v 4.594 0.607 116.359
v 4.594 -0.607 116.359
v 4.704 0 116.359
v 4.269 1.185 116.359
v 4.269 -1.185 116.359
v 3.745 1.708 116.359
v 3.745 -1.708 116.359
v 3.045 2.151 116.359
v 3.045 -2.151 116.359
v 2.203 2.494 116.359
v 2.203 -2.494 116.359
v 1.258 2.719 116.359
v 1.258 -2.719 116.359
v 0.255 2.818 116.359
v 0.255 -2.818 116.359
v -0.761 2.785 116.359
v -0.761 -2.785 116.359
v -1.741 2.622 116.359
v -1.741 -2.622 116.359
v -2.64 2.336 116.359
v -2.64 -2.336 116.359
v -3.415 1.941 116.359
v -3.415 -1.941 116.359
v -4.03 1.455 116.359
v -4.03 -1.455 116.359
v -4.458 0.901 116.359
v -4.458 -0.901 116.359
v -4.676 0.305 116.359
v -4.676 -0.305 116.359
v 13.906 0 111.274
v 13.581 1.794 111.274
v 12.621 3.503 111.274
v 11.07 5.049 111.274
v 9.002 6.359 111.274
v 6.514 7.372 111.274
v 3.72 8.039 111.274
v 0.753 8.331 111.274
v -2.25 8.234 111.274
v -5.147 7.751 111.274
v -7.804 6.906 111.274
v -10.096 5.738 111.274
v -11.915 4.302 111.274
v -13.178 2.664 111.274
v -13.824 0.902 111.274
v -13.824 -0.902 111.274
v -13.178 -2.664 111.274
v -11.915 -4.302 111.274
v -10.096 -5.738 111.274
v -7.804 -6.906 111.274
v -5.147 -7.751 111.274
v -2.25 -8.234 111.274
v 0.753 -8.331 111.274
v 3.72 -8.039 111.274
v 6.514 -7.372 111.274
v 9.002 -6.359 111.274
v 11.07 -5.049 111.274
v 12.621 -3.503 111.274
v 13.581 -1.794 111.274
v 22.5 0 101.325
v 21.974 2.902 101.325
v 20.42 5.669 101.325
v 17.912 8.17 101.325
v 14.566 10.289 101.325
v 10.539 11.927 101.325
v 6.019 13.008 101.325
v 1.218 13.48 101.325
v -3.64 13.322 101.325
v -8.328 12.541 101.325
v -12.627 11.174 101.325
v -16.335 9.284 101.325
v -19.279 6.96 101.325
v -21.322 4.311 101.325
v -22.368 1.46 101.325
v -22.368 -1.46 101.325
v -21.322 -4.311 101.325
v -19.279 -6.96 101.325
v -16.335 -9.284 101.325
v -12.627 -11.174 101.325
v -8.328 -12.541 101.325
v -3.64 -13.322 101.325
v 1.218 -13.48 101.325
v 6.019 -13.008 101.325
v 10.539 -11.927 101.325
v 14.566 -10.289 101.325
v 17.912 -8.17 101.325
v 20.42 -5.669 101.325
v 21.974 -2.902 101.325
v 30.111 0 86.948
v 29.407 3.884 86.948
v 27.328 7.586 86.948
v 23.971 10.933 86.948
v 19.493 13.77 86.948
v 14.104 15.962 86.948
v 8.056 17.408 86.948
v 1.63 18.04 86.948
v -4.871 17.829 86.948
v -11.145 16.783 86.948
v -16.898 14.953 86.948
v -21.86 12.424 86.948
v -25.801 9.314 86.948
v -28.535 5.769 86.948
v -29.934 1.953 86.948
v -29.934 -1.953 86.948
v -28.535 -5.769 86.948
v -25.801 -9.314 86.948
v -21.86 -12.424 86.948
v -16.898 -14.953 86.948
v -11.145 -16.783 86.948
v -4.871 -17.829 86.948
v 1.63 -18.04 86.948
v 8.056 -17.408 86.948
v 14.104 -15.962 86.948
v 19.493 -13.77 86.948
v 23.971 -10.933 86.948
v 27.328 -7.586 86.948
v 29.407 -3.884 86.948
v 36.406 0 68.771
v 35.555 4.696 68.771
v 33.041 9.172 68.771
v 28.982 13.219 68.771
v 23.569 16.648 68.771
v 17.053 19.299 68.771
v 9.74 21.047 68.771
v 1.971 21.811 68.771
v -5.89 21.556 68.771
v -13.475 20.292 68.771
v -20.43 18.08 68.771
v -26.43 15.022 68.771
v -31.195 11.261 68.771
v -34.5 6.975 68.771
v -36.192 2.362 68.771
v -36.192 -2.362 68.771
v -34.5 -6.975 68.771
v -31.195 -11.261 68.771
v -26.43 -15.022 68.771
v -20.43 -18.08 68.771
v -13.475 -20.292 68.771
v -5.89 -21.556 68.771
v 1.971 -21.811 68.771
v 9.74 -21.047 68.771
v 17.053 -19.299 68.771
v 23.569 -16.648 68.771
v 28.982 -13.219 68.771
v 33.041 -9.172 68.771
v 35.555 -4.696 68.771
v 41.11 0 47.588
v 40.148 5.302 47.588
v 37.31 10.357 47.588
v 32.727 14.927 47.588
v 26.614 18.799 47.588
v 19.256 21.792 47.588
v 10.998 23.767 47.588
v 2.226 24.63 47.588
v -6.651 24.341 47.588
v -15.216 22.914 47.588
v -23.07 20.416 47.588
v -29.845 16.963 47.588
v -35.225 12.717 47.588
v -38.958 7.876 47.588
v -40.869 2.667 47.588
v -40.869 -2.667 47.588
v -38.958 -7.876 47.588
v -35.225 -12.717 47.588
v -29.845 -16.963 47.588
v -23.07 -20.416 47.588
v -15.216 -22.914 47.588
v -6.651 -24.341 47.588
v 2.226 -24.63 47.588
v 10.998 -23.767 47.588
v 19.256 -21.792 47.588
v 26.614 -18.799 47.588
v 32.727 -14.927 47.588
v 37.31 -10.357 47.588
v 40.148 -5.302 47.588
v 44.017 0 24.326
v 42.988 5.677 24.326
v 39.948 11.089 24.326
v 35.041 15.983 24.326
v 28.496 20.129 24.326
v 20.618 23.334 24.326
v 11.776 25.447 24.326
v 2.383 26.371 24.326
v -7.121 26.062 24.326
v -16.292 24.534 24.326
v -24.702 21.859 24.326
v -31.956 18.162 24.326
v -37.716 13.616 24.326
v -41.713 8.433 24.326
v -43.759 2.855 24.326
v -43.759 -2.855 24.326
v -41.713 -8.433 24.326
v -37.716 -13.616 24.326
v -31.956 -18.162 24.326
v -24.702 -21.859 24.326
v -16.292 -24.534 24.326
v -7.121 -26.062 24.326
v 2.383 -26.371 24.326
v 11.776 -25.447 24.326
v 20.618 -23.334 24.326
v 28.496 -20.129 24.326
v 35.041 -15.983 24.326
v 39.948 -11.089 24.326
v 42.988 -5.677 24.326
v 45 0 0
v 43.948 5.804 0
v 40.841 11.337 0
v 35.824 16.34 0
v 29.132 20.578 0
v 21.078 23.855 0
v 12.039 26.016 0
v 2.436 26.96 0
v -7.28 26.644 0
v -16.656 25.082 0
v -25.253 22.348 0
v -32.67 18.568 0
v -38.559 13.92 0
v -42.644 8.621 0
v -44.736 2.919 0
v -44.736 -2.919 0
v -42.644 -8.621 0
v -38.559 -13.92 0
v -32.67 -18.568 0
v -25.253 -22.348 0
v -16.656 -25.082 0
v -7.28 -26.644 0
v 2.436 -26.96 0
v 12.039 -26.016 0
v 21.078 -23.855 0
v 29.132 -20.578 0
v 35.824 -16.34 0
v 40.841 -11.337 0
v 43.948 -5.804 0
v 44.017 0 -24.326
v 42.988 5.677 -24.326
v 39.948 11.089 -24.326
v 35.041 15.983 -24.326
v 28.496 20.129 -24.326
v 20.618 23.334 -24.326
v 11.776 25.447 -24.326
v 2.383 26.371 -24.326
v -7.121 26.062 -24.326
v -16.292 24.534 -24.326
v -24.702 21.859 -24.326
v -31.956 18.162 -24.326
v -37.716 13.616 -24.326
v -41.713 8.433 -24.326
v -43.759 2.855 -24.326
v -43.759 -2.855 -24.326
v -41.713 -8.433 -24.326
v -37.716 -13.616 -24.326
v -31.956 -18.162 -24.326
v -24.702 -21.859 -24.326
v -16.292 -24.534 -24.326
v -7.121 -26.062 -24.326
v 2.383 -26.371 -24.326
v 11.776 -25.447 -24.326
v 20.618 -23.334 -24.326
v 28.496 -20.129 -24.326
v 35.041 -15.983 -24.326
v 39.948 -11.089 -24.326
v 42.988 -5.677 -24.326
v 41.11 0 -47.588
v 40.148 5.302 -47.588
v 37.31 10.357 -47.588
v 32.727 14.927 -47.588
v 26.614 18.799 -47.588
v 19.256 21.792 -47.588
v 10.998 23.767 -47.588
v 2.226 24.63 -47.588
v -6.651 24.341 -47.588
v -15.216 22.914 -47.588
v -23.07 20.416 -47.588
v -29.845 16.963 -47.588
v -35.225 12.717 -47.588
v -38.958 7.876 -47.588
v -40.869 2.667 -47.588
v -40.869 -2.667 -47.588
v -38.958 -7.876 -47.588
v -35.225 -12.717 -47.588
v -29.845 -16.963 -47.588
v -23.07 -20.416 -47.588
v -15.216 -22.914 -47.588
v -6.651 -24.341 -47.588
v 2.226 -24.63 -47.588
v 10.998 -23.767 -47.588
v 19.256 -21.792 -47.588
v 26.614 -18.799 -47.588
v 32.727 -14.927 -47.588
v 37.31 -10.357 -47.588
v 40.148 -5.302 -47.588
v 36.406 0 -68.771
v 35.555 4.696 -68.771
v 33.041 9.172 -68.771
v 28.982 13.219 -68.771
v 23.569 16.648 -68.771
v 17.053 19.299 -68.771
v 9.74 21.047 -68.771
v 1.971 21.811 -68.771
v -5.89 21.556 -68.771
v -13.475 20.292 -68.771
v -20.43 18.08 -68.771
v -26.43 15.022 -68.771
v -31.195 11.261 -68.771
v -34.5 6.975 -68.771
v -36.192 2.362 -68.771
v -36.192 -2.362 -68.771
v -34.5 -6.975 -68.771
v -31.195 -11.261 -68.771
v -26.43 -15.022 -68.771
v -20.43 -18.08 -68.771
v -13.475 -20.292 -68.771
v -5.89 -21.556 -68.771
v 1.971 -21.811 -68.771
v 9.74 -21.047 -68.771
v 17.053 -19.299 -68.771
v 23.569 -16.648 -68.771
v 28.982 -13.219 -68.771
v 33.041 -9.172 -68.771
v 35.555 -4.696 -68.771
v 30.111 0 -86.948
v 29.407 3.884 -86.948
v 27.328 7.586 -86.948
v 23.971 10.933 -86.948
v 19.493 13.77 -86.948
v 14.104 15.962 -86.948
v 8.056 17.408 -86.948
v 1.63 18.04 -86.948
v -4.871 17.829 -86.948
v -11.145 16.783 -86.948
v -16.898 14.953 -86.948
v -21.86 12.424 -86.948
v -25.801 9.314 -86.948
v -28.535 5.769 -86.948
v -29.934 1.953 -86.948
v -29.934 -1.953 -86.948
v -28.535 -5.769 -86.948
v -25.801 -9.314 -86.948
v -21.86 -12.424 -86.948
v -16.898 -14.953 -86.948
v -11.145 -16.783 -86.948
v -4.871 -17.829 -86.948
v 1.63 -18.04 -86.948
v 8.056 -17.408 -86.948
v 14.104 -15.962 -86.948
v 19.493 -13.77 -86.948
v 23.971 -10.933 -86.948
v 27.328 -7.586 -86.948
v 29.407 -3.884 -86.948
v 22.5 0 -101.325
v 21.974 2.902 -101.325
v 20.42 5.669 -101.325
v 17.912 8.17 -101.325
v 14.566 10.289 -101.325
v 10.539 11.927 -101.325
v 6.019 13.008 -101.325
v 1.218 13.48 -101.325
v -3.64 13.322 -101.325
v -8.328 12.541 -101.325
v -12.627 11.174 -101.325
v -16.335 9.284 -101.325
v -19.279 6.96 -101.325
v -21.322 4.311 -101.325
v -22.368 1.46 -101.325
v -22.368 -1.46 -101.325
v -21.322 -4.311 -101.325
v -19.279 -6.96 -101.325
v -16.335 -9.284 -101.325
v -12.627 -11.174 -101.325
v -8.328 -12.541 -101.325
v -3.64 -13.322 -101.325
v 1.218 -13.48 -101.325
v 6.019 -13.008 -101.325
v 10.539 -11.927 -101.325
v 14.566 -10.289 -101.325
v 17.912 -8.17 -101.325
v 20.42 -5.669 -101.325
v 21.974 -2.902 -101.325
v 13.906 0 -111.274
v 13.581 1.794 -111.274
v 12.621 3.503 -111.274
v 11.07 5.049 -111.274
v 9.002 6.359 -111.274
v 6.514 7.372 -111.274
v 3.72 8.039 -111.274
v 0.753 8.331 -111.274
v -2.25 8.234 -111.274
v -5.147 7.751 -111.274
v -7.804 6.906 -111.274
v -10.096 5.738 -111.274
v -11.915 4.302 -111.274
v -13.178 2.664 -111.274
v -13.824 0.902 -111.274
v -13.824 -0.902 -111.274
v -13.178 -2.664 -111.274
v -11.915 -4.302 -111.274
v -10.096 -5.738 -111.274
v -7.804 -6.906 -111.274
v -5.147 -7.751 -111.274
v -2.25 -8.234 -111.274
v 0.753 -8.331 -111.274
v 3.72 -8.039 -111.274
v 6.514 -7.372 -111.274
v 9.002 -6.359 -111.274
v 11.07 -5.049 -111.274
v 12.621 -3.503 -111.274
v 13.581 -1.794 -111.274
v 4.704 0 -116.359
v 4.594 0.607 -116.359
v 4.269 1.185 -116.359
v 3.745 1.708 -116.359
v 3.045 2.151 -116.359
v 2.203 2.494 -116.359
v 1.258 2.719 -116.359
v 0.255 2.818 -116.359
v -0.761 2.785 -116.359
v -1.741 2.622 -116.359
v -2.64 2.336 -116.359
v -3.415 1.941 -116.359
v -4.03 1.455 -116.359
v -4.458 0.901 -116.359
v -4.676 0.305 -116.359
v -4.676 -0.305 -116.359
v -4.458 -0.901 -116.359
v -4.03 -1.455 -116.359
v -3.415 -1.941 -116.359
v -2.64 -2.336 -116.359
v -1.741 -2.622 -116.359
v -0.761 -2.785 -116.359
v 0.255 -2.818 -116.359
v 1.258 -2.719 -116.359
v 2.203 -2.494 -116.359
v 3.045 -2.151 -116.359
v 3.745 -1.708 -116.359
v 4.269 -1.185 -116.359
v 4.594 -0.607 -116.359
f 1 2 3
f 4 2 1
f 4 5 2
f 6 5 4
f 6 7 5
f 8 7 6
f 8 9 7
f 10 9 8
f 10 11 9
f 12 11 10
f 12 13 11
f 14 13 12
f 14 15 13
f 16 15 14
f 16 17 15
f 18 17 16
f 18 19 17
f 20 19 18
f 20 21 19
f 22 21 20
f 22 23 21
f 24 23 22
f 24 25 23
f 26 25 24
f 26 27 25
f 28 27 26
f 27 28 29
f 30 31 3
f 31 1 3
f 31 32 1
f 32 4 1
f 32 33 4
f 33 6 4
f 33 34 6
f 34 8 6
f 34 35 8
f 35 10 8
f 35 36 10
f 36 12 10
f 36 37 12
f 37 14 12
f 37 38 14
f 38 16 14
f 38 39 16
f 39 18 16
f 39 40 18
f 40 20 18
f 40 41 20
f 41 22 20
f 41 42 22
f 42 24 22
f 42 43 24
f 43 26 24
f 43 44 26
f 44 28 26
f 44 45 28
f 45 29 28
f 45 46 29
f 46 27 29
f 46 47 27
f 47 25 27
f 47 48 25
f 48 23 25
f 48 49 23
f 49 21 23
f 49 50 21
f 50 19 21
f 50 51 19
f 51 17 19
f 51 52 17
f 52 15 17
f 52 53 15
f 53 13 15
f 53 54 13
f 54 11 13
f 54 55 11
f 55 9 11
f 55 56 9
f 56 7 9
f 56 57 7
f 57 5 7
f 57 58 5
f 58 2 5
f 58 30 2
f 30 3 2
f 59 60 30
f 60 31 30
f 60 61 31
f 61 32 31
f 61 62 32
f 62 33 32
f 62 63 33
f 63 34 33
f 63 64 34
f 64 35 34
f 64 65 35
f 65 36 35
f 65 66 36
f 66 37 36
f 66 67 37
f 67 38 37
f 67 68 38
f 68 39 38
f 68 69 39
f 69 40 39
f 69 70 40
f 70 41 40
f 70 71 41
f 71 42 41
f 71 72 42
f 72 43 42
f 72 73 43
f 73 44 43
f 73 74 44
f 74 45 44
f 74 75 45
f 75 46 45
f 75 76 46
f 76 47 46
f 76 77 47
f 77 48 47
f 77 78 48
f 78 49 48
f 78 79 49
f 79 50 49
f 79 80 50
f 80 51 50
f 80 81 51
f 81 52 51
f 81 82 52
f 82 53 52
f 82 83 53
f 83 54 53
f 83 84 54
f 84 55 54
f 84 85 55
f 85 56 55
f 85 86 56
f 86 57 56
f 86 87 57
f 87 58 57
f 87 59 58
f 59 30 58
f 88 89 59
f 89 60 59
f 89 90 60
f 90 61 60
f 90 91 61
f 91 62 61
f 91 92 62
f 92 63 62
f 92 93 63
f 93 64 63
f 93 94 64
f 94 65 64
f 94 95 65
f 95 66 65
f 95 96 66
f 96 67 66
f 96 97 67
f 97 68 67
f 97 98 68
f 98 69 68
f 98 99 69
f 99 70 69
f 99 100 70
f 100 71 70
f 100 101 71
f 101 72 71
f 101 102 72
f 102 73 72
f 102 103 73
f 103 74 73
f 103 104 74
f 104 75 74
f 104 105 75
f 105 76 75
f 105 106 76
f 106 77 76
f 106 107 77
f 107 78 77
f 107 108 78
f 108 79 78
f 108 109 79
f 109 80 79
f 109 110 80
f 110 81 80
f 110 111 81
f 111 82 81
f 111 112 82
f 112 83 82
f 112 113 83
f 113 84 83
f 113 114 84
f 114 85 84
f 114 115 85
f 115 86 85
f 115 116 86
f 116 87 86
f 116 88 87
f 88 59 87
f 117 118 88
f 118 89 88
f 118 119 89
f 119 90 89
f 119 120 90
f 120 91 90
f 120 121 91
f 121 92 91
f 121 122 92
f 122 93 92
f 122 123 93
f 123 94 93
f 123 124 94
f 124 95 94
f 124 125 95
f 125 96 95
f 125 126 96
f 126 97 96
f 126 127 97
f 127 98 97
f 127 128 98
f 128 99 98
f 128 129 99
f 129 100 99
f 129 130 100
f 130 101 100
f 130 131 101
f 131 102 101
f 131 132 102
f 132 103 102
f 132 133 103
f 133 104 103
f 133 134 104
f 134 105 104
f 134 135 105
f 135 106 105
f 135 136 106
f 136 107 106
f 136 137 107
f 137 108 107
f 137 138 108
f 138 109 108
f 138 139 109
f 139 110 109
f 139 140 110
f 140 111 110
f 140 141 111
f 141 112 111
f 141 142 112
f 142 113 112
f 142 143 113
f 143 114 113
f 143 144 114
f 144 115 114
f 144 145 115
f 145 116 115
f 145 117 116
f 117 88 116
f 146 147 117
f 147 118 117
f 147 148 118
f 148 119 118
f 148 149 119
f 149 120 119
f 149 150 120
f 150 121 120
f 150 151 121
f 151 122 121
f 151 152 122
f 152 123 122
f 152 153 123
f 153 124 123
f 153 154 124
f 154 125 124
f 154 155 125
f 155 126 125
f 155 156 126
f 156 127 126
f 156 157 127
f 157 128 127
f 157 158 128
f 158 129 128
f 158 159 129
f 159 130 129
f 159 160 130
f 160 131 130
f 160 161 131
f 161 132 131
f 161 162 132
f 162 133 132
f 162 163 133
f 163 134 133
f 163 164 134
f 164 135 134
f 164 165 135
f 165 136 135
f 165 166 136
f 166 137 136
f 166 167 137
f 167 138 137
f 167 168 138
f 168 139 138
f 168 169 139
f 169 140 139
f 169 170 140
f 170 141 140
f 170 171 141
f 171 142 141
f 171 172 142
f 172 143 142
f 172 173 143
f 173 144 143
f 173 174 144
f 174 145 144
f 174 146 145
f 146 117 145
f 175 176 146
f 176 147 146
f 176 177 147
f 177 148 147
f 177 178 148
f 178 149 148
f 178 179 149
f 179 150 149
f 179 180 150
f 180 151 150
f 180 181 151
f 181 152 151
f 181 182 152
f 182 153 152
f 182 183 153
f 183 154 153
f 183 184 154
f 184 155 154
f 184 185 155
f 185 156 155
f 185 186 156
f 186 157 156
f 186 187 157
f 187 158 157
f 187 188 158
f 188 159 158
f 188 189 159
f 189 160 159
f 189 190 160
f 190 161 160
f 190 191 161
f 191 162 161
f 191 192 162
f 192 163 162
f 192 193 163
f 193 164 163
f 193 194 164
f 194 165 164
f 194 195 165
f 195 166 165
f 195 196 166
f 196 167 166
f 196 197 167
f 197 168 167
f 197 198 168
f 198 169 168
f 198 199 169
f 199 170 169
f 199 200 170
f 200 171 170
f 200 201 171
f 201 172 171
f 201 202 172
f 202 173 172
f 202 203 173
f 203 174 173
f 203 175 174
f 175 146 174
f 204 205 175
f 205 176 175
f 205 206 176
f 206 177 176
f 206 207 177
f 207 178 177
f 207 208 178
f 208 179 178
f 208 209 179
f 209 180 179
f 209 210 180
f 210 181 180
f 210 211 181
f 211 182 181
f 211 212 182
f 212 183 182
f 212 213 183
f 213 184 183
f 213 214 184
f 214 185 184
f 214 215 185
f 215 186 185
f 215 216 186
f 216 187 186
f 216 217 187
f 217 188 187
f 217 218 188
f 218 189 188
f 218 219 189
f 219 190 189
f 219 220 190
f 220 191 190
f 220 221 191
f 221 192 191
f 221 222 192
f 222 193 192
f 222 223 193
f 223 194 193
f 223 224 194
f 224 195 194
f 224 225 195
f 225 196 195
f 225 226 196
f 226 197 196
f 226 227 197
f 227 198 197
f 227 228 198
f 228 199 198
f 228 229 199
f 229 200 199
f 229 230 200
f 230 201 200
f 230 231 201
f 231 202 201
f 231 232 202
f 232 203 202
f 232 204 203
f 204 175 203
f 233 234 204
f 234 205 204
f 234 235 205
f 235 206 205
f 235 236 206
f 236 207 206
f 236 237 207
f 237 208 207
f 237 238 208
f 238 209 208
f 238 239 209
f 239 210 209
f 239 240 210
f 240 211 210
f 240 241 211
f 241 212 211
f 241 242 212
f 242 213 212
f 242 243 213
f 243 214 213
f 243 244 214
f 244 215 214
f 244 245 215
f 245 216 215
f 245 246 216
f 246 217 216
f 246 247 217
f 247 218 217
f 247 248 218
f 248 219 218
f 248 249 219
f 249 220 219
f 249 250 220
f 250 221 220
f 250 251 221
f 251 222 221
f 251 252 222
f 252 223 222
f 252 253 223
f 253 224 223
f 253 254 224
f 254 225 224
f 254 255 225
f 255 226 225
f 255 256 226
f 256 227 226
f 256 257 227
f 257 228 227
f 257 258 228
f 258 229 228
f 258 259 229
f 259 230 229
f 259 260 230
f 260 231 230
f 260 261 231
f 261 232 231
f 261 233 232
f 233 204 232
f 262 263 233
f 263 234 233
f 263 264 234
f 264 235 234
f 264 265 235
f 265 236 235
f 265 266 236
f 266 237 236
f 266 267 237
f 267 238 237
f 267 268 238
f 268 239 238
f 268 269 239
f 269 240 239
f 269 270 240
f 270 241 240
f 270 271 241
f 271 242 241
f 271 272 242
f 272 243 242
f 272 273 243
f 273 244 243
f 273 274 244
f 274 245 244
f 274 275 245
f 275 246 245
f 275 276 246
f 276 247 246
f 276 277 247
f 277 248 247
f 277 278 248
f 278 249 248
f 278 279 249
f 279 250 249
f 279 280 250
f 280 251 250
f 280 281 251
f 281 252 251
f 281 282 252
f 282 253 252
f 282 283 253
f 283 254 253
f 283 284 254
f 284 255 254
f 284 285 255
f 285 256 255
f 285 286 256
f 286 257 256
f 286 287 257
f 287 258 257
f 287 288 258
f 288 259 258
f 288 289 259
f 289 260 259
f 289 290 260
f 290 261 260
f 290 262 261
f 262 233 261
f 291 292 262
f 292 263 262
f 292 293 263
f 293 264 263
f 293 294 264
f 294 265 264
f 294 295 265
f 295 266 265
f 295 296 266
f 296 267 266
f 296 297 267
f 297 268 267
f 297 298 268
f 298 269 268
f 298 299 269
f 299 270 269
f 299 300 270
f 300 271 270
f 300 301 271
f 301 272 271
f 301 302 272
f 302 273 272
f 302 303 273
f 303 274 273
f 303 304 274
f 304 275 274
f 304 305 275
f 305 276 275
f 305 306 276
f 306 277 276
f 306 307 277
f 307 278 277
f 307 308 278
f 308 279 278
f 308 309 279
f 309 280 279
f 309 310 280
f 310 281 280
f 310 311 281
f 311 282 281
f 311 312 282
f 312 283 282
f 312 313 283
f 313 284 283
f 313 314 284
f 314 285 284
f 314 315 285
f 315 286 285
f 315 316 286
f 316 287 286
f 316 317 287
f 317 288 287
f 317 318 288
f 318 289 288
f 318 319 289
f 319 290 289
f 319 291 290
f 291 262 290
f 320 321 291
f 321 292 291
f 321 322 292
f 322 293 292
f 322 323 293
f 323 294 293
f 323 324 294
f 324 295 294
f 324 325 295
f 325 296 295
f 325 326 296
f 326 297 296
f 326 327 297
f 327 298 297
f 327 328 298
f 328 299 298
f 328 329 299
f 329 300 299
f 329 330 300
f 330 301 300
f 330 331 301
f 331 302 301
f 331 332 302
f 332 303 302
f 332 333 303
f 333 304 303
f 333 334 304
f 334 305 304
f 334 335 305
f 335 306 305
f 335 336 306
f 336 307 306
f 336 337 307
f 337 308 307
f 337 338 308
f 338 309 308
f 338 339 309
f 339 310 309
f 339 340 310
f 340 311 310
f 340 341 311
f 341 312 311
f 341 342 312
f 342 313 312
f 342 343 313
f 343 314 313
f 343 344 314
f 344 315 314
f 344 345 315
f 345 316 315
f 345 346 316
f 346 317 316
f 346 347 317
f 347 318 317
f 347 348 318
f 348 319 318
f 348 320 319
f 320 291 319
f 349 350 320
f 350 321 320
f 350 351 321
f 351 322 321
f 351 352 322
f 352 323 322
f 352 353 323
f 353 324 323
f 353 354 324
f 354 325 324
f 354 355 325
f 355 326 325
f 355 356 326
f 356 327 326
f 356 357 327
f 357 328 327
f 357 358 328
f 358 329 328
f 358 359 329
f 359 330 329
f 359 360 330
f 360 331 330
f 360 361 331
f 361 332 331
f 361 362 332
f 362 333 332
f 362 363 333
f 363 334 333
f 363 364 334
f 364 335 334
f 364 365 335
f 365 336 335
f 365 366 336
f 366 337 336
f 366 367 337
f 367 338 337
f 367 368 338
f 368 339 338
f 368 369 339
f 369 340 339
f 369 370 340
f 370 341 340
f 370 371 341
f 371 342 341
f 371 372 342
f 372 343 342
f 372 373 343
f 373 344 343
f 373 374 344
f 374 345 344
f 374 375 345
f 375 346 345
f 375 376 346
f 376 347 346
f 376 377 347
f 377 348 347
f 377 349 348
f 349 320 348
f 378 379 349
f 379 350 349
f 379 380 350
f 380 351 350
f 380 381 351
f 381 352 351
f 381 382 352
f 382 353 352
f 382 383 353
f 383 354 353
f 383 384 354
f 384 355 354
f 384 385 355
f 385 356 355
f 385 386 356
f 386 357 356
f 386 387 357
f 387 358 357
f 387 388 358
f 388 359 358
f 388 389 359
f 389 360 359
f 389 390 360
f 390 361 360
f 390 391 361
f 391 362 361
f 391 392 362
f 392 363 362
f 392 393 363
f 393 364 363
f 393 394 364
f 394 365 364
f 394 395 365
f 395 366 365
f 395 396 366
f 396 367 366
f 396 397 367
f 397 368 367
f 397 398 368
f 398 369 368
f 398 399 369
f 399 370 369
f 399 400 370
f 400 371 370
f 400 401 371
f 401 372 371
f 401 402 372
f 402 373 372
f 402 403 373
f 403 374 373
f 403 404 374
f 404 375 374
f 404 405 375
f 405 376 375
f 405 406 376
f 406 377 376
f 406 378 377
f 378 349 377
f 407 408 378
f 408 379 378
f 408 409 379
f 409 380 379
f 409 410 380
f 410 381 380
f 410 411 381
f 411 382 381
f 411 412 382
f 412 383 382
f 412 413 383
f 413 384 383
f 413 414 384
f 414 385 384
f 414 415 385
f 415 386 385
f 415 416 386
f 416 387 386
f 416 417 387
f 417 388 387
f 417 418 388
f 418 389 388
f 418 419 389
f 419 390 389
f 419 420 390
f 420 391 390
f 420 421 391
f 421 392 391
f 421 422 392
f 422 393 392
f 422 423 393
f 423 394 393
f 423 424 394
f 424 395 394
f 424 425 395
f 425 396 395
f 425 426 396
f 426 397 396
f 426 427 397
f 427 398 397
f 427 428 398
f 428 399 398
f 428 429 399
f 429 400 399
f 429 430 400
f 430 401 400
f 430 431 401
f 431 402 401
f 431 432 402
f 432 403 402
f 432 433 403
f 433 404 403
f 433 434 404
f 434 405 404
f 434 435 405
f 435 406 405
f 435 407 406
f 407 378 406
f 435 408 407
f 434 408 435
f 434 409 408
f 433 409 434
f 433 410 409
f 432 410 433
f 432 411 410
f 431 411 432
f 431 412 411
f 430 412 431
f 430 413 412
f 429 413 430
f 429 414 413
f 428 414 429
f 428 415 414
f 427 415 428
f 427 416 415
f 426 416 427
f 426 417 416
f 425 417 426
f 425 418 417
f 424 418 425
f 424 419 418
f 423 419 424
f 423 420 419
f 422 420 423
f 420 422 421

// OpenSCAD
// Generated by SolidPython 1.0.1 on 2020-07-29 00:46:46


scale(v = [5, 3, 13]) {
	sphere(r = 9);
}
/***********************************************
*********      SolidPython code:      **********
************************************************
 
# import packages: SolidPython
from solid import *
from solid.utils import *
from itertools import chain, combinations, permutations


class Resize:

    def __init__(self, scad_file):
        self.scad_file = scad_file
        #self.scad_file = import_scad(scad_file)
        # cone/cylinder param:
        self.r1 = 0
        self.r2 = 0
        self.h = 0
        # rectangular prism param:
        self.w = 0
        self.l = 0
        # ellipse param:
        self.r = 0

    # import OpenScad code (file name corresponds to shape)


    # classify shape + parameters
    def assign(self, param1, param2, param3):
        if self.scad_file == 'cone.scad':
            self.r1 = param1
            self.r2 = param2
            self.h = param3
        elif self.scad_file == 'cylinder.scad':
            self.r1 = param1
            self.r2 = param2
            self.h = param3
        elif self.scad_file == 'rectangularPrism.scad':
            self.h = param1
            self.l = param2
            self.w = param3
        else:
            self.r = param1
            self.h = param2

    # resize parameters
    def iterate(self):
        x = range(3, 20, 2)
        i = 1
        if self.scad_file == 'cone.scad':
            tempList = list(permutations(x, 2))
            for temp in tempList:
                param1 = temp[0]
                param2 = temp[1]
                filepath = 'produced_scad_files/' + 'cone' + str(param1) + '_' + str(param2) + '_' + '.scad'
                scad_render_to_file(cylinder(h=param1, r1=param2, r2=0), filepath)

        elif self.scad_file == 'cylinder.scad':
            tempList = list(permutations(x, 3))
            for temp in tempList:
                param1 = temp[0]
                param2 = temp[1]
                filepath = 'produced_scad_files/' + 'cylinder' + str(param1) + '_' + str(param2) + '_' + '.scad'
                scad_render_to_file(cylinder(h=param1, r1=param2, r2=param2), filepath)

        elif self.scad_file == 'rectangularPrism.scad':
            tempList = list(permutations(x, 3))
            for temp in tempList:
                param1 = temp[0]
                param2 = temp[1]
                param3 = temp[2]
                filepath = 'produced_scad_files/' + 'rectangularPrism' + str(param1) + '_' + str(param2) + '_' + str(
                    param3) + '.scad'
                scad_render_to_file(cube(size=(param1, param2, param3)), filepath)

        elif self.scad_file == 'ellipse.scad':
            tempList = list(permutations(x, 4))
            for temp in tempList:
                param1 = temp[0]
                param2 = temp[1]
                param3 = temp[2]
                param4 = temp[3]
                filepath = 'produced_scad_files/' + 'ellipse' + str(param1) + '_' + str(param2) + '_' + str(param3) + '_' + str(param4) + '.scad'
                scad_render_to_file(scale([param1, param2, param3])(sphere(r=param4)), filepath)

    def render_to_scadfile(self):
        scad_render_to_file(scad, 'example.scad') 
 
************************************************/
